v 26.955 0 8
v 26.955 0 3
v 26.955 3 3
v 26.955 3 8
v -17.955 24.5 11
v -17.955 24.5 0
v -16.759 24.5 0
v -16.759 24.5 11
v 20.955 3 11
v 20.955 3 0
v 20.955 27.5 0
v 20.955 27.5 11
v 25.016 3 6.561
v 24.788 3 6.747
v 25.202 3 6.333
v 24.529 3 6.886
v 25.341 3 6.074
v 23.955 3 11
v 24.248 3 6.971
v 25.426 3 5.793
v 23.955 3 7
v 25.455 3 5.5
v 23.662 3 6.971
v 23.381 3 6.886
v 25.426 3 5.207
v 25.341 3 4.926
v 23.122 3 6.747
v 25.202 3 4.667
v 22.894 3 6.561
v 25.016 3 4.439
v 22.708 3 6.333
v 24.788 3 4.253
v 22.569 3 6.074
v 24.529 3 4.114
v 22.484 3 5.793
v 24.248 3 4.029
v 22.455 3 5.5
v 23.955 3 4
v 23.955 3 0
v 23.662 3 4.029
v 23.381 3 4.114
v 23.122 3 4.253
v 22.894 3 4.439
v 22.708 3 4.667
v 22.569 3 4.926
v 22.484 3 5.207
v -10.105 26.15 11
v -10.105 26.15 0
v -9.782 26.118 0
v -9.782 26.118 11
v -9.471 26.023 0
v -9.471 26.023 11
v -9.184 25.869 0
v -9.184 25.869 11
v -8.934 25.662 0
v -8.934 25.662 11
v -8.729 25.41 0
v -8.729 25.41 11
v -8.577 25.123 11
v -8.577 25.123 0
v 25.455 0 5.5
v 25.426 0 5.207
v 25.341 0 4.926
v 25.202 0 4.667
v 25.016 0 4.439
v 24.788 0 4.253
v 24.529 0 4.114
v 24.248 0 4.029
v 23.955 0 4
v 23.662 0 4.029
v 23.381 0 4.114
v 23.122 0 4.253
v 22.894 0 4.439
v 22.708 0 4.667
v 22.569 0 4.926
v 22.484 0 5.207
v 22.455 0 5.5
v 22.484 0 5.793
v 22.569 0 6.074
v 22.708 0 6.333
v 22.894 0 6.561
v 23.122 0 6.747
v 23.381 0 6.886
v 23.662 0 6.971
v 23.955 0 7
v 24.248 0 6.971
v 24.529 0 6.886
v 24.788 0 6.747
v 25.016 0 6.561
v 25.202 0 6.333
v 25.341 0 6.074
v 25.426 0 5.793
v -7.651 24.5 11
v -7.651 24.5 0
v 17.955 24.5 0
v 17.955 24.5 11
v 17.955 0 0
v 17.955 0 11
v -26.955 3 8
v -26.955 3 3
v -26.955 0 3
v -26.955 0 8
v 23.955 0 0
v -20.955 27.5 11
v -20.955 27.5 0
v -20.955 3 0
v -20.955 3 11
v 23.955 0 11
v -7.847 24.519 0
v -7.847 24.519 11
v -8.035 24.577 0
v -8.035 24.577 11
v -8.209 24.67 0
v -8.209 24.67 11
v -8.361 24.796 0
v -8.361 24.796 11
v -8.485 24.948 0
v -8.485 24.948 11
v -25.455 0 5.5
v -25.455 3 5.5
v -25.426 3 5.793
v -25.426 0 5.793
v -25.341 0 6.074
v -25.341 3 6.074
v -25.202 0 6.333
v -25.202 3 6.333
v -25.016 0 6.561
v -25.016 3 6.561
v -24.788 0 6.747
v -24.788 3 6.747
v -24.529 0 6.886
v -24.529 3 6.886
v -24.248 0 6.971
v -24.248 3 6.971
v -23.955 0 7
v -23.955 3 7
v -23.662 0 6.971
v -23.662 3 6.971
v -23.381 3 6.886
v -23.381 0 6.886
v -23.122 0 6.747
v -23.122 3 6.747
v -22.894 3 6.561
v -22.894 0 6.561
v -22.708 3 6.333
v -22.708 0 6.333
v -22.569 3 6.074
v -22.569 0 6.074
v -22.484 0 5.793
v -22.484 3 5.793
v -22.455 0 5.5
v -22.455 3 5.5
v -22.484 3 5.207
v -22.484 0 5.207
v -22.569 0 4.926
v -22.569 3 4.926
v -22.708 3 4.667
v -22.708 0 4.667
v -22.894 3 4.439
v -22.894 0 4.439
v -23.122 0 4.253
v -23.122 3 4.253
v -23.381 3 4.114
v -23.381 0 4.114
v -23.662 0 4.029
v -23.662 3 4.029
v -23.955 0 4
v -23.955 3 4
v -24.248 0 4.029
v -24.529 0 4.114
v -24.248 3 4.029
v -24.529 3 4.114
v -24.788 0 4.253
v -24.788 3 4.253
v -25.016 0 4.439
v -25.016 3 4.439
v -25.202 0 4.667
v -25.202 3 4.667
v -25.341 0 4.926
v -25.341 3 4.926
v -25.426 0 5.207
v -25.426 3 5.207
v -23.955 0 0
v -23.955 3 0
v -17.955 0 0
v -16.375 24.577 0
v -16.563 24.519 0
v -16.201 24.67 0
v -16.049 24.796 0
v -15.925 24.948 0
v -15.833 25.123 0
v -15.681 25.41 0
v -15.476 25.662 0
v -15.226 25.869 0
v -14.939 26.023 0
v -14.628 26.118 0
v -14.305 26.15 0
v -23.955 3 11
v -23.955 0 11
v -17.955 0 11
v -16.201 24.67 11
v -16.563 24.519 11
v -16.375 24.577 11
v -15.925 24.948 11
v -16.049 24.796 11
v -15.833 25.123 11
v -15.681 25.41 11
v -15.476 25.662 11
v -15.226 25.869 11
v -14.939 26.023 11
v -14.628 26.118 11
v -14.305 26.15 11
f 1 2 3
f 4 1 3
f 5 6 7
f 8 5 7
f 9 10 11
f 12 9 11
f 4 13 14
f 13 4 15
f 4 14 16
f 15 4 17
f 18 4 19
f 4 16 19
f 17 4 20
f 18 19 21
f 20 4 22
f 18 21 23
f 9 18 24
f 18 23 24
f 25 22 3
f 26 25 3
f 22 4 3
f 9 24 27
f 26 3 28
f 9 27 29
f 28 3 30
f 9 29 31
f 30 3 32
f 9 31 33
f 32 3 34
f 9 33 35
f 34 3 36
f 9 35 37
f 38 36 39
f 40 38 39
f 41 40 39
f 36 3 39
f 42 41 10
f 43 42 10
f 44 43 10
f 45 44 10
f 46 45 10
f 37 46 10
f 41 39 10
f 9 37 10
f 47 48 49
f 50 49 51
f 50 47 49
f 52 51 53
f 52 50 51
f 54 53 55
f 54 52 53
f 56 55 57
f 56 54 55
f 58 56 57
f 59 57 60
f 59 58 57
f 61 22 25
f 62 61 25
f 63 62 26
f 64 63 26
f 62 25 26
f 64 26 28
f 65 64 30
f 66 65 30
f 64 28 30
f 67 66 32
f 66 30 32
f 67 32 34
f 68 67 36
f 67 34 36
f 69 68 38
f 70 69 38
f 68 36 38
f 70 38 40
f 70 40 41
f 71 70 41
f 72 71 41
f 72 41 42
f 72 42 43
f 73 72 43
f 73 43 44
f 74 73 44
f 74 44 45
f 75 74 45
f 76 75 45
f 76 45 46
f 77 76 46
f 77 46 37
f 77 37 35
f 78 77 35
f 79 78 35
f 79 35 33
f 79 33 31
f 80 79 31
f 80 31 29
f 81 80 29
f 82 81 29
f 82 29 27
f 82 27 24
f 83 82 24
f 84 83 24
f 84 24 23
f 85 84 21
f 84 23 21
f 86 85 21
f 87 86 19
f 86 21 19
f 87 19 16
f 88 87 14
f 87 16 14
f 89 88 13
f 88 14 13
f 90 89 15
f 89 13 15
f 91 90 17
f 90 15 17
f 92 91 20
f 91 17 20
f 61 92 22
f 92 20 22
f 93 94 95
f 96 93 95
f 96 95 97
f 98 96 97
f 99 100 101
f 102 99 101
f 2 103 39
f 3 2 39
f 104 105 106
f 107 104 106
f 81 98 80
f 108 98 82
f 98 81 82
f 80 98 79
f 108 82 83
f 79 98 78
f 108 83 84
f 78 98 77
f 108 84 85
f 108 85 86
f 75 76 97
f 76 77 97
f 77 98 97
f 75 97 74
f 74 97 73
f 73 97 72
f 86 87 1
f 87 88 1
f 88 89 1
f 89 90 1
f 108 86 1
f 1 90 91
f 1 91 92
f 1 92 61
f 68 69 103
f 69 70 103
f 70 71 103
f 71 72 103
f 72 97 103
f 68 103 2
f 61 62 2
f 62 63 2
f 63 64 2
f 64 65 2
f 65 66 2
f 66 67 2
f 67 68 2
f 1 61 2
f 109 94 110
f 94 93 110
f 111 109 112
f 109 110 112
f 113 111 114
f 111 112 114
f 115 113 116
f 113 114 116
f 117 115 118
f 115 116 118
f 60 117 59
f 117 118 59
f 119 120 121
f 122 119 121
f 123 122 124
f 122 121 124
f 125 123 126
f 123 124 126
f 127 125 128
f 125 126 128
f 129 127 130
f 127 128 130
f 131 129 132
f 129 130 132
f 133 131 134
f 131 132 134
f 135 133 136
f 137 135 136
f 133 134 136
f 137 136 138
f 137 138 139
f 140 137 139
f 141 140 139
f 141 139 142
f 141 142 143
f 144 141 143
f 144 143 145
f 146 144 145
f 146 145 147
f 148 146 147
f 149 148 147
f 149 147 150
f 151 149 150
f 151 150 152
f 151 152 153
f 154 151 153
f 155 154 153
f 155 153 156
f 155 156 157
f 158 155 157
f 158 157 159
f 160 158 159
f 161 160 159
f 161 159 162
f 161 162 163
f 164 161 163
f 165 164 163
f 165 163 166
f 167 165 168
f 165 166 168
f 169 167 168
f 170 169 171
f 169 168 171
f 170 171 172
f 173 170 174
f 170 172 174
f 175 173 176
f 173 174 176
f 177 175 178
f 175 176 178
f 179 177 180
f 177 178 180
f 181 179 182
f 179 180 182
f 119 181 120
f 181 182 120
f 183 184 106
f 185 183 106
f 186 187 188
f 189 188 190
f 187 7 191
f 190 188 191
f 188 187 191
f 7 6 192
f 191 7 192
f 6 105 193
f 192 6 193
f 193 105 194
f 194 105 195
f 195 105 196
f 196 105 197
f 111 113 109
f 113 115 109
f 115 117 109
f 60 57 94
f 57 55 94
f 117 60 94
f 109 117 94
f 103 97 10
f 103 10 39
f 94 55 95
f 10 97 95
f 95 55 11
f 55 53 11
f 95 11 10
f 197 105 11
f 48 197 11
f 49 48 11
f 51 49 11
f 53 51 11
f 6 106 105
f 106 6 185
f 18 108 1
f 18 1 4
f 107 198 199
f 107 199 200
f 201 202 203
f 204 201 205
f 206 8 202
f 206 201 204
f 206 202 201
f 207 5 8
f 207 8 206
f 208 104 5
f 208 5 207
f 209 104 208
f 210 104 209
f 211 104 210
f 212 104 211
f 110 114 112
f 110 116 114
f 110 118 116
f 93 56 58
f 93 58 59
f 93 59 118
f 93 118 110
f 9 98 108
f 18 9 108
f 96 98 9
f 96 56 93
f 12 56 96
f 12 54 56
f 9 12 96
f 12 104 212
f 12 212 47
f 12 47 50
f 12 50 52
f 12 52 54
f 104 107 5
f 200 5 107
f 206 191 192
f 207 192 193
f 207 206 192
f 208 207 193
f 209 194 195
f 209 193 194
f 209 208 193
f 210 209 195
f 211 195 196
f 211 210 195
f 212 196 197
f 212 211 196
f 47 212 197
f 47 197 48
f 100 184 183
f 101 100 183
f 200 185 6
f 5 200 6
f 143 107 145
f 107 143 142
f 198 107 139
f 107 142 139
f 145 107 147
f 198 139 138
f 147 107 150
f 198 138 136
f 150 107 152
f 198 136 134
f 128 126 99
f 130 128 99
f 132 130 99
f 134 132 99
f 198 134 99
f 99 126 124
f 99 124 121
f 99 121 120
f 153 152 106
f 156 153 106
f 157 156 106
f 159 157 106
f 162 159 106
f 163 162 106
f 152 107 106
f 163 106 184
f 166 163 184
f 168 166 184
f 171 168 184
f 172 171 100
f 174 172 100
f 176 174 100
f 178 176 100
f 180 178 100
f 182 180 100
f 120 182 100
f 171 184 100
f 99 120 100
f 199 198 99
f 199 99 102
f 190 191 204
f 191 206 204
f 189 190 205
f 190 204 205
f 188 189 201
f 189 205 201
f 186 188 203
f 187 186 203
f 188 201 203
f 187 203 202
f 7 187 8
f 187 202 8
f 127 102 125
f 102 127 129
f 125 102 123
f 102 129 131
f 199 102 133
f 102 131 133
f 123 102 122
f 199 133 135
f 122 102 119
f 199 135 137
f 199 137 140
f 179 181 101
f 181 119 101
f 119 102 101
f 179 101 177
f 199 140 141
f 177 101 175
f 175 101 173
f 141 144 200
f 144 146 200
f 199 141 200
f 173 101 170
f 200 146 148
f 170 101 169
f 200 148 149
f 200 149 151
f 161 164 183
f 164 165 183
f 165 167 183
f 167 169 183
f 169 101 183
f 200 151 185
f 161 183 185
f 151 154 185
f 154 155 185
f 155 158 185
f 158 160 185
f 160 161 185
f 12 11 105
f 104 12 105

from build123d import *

# Parameters (mm, degrees)
BOSS_EXTRUDE1_DEPTH = 11
CHAMFER1_SIZE       = 3
SKETCH2_R           = 1.5
CUT_EXTRUDE1_DEPTH  = 39.050256569
CUT_EXTRUDE2_DEPTH  = 41.047746816
FILLET1_R           = 1


with BuildPart() as part:
    # Sketch1 → Boss-Extrude1 (new body)
    with BuildSketch(Plane.XY):
        Polygon((-26.955, 0), (-17.955, 0), (-17.955, 24.5), (17.955, 24.5), (17.955, 0), (26.955, 0), (26.955, 3), (20.955, 3), (20.955, 27.5), (-20.955, 27.5), (-20.955, 3), (-26.955, 3), align=None)
    extrude(amount=BOSS_EXTRUDE1_DEPTH)

    # Chamfer1
    chamfer1_edges = [part.edges().sort_by_distance(p)[0] for p in [
        (-26.955, 1.5, 0),
        (26.955, 1.5, 0),
        (26.955, 1.5, 11),
        (-26.955, 1.5, 11),
    ]]
    chamfer(chamfer1_edges, length=CHAMFER1_SIZE)

    # Sketch2 → Cut-Extrude1 (cut, through all)
    with BuildSketch(Plane(origin=(0, 3, 0), x_dir=(1, 0, 0), z_dir=(0, 1, 0))):
        with Locations(Location((-23.955, -5.5, 0), (0, 0, 180))):
            Circle(SKETCH2_R)
        with Locations((23.955, -5.5)):
            Circle(SKETCH2_R)
    extrude(amount=-CUT_EXTRUDE1_DEPTH, mode=Mode.SUBTRACT)

    # Sketch3 → Cut-Extrude2 (cut, through all)
    with BuildSketch(Plane.XY.offset(11)):
        with BuildLine():
            Line((-14.305, 26.15), (-10.105, 26.15))
            ThreePointArc((-10.105, 26.15), (-8.455, 24.5), (-10.105, 22.85))
            Line((-10.105, 22.85), (-14.305, 22.85))
            ThreePointArc((-14.305, 22.85), (-15.955, 24.5), (-14.305, 26.15))
        make_face()
    extrude(amount=-CUT_EXTRUDE2_DEPTH, mode=Mode.SUBTRACT)

    # Fillet1
    fillet1_edges = [part.edges().sort_by_distance(p)[0] for p in [
        (-15.955, 24.5, 5.5),
        (-8.455, 24.5, 5.5),
    ]]
    fillet(fillet1_edges, radius=FILLET1_R)


solid = part.part
